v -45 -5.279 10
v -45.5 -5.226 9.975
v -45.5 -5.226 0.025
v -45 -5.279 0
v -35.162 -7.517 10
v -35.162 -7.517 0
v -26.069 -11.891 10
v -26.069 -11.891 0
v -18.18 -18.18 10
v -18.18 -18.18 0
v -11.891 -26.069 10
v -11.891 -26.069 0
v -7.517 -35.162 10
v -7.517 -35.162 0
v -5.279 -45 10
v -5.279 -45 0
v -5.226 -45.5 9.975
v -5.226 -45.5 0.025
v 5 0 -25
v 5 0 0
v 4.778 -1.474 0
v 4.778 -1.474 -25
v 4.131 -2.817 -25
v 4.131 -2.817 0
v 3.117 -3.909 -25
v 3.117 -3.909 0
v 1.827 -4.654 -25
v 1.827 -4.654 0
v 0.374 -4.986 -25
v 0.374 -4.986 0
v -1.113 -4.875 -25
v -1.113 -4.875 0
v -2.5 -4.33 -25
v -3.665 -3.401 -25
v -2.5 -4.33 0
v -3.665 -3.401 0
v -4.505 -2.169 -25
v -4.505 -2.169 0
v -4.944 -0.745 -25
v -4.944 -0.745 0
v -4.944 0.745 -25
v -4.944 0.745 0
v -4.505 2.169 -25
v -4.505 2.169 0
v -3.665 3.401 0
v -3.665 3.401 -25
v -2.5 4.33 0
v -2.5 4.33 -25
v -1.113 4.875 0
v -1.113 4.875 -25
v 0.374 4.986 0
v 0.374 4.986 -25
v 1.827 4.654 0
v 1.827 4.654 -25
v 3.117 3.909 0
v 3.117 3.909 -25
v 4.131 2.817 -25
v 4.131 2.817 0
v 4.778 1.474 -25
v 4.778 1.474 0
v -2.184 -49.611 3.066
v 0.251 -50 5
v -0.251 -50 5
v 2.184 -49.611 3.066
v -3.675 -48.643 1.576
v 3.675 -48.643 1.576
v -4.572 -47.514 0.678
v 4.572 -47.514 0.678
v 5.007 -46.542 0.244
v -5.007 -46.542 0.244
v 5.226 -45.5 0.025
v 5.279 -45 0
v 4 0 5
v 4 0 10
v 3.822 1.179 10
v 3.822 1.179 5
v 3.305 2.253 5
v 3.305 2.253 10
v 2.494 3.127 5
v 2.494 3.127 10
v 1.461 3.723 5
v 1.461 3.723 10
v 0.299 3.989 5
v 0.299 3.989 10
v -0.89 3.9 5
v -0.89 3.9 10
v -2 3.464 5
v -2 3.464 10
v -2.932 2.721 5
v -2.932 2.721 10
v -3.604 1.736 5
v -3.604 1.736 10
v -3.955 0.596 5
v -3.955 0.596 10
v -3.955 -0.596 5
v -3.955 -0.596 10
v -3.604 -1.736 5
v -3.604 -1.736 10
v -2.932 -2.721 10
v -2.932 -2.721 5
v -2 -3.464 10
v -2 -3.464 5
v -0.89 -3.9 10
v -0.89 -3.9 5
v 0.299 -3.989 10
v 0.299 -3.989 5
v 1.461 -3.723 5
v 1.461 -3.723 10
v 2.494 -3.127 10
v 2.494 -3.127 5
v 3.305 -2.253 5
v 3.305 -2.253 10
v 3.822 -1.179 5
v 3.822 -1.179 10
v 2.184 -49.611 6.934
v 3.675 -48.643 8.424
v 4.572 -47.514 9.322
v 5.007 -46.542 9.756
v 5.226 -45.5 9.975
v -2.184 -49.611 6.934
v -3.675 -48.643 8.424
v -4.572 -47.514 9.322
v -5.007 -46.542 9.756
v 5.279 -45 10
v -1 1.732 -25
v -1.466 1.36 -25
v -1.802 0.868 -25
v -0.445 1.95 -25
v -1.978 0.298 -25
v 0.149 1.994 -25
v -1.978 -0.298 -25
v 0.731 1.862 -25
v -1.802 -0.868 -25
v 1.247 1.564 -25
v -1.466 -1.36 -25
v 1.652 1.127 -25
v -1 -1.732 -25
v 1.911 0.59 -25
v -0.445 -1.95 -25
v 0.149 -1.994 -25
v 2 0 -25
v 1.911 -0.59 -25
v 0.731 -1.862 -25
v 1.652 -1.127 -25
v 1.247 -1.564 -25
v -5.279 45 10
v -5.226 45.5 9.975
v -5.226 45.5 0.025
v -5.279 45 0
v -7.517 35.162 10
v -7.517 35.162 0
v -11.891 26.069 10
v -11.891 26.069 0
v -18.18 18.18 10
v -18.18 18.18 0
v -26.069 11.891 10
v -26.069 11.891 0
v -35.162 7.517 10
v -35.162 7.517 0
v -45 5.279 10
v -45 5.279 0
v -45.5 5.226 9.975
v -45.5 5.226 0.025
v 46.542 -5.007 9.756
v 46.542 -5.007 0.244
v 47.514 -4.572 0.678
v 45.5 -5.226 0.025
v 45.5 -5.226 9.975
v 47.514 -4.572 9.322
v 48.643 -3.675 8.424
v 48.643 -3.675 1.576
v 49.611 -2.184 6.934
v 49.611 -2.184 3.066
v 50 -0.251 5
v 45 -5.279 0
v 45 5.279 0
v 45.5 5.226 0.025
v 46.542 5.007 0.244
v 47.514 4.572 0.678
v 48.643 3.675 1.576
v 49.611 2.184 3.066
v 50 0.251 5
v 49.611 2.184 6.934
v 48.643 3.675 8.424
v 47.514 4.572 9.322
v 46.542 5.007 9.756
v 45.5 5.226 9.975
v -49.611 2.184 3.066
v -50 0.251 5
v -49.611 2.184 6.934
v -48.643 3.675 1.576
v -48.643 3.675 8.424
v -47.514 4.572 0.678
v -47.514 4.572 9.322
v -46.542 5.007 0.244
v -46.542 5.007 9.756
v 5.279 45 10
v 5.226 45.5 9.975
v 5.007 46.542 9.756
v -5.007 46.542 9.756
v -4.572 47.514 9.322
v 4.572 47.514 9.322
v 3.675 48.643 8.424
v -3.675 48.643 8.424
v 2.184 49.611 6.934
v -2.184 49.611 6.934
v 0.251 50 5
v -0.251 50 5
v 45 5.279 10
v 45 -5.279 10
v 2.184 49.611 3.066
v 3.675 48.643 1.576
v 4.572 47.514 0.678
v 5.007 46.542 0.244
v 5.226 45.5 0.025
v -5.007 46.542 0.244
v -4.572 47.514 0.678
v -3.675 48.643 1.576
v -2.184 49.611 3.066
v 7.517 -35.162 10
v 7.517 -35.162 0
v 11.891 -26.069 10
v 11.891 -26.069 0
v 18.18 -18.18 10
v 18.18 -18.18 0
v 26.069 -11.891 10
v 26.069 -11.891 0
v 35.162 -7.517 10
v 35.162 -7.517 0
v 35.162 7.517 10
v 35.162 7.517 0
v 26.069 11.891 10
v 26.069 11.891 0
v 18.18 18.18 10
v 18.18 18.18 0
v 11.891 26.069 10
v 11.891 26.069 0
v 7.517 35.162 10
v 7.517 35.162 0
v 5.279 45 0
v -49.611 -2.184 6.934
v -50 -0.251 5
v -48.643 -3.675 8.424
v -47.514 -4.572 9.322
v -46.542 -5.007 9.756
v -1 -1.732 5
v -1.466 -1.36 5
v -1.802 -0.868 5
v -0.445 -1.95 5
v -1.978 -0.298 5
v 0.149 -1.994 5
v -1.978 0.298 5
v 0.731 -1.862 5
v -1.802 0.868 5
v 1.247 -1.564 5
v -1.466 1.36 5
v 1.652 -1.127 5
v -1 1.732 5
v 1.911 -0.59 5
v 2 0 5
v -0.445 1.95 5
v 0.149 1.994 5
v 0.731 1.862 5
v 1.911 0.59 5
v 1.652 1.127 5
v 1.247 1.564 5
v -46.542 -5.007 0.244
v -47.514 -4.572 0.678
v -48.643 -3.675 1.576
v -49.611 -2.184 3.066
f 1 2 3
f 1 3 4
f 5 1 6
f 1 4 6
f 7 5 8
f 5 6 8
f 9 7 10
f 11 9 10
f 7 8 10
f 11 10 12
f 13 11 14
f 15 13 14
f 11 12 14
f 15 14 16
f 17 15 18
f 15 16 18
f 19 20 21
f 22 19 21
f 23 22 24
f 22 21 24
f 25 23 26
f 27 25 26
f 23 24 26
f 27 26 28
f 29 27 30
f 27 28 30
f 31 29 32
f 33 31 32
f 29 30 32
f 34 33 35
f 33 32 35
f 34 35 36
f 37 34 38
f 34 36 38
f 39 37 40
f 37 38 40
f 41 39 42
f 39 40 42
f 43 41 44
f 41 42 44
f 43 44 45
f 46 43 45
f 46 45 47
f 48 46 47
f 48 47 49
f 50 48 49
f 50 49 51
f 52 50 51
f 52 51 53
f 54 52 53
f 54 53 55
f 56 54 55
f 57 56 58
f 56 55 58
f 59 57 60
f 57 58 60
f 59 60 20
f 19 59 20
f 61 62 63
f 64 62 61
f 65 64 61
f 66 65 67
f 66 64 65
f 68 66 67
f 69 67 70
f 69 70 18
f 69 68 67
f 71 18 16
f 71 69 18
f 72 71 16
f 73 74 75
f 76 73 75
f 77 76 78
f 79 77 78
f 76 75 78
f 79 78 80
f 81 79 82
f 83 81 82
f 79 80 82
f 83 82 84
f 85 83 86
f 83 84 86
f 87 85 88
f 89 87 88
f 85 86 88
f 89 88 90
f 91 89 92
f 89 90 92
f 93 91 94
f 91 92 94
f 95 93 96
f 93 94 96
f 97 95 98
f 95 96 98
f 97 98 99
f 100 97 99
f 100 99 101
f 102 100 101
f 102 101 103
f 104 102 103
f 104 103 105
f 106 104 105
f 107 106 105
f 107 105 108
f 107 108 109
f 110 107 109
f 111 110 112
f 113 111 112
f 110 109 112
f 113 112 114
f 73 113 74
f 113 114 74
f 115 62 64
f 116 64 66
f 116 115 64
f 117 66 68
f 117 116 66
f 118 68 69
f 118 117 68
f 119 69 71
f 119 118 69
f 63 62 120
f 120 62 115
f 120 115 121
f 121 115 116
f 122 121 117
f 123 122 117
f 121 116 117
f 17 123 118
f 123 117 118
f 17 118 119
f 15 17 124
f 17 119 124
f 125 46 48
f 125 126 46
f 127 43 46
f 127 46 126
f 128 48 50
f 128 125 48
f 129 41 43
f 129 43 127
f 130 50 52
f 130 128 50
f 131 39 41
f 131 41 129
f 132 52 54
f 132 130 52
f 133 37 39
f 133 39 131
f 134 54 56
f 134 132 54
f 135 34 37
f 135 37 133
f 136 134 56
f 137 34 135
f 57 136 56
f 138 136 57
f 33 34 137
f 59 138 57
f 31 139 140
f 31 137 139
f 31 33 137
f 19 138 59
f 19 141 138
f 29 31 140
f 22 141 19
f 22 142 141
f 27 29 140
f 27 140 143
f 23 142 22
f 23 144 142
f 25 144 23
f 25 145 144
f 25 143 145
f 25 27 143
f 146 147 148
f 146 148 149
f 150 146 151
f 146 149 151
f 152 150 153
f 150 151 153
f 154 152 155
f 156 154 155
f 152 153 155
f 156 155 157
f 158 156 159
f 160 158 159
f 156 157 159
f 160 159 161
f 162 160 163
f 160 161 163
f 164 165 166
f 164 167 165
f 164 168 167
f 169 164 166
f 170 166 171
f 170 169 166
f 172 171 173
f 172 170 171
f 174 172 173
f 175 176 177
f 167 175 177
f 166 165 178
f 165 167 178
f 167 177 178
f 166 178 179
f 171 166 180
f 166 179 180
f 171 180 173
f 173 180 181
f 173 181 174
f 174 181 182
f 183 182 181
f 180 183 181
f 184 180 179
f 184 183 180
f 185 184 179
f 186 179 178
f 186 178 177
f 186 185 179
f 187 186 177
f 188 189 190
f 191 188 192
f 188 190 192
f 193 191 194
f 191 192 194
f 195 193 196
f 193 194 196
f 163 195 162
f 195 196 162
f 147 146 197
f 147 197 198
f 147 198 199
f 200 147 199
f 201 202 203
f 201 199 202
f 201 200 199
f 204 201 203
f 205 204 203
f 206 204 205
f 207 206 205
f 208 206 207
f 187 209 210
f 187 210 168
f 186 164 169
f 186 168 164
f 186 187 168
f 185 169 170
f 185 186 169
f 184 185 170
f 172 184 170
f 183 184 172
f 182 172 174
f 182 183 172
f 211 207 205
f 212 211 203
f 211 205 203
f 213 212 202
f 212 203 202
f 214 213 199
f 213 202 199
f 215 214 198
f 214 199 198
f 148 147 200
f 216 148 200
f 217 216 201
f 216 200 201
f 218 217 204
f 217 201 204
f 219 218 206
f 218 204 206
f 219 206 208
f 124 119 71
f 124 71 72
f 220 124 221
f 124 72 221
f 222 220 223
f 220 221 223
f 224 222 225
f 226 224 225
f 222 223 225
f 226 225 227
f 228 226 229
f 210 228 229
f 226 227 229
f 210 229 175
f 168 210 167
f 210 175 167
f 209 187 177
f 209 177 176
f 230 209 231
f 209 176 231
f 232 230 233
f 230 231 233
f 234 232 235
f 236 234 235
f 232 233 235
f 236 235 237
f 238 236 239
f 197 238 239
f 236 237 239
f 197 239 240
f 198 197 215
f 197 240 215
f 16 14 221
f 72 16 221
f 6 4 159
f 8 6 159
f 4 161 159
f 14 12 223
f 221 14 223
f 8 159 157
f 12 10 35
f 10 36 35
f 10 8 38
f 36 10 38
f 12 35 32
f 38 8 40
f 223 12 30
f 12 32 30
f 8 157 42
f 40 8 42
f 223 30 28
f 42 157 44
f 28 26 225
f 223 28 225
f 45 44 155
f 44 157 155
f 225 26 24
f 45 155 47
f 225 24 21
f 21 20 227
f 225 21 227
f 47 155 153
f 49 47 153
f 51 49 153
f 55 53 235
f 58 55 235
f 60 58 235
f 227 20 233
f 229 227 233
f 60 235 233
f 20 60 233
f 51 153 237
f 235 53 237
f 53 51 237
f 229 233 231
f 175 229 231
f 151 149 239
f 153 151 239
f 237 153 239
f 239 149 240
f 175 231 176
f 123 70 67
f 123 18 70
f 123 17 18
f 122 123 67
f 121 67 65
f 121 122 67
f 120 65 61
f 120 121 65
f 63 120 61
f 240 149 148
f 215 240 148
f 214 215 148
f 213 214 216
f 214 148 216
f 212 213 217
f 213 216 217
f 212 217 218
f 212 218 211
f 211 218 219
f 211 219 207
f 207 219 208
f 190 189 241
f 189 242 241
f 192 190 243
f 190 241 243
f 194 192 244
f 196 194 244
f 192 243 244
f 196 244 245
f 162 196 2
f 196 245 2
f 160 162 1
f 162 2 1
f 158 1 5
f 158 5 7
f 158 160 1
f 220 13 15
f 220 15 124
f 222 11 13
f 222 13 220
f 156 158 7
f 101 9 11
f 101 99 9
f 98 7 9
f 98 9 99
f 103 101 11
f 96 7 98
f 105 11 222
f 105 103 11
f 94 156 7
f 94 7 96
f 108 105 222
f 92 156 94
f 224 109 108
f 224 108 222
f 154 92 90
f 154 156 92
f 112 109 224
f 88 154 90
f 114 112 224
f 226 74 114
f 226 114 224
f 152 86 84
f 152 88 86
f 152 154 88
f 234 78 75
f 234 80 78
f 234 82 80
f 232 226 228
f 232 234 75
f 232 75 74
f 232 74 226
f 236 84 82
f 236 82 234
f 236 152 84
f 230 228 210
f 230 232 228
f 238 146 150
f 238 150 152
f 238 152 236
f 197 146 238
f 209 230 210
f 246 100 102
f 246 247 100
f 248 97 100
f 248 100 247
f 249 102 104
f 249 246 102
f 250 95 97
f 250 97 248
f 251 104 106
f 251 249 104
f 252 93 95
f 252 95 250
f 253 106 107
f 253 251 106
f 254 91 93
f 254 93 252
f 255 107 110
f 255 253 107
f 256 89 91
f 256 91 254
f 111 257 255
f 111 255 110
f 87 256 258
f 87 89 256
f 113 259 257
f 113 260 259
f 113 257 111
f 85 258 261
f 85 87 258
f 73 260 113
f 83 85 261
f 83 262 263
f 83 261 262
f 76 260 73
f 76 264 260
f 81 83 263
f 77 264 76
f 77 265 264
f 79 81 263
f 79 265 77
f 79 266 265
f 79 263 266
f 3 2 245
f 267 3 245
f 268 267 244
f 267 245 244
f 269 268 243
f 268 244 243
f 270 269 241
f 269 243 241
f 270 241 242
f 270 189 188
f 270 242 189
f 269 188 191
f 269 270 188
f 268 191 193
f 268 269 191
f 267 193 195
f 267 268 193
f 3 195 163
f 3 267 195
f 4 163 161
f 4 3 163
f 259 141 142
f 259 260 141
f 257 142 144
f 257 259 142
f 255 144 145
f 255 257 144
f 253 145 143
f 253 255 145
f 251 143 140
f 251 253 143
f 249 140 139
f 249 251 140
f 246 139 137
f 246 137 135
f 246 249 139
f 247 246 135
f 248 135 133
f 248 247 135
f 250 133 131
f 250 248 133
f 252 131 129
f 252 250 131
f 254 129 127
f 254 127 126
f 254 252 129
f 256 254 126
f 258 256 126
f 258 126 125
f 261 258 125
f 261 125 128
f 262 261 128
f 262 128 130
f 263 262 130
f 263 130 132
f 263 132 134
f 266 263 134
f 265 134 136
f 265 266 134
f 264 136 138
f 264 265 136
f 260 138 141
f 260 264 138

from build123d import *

# Parameters (mm, degrees)
F1_DEPTH = 10
F2_R     = 2
F3_DEPTH = 10
F2_R_2   = 4
F4_DEPTH = 5
F5_R     = 4.99999
F6_R     = 5
F6_R_2   = 2
F7_DEPTH = 25


# Not quite as in the source:
# - a fillet or chamfer is up to 0.001 mm smaller than in the source, because OpenCascade refuses the exact size


with BuildPart() as f1:
    # F0 (on Top) → F1 (new body)
    with BuildSketch(Plane.XY):
        with BuildLine():
            ThreePointArc((-50, -5), (-18.1801948466, -18.1801948466), (-5, -50))
            Line((-5, -50), (5, -50))
            ThreePointArc((5, -50), (18.1801948466, -18.1801948466), (50, -5))
            Line((50, -5), (50, 5))
            ThreePointArc((50, 5), (18.1801948466, 18.1801948466), (5, 50))
            Line((5, 50), (-5, 50))
            ThreePointArc((-5, 50), (-18.1801948466, 18.1801948466), (-50, 5))
            Line((-50, 5), (-50, -5))
        make_face()
    extrude(amount=F1_DEPTH)

    # F2 (on face) → F3 (cut, through all)
    with BuildSketch(Plane.XY.offset(10)):
        Circle(F2_R)
    extrude(amount=-F3_DEPTH, mode=Mode.SUBTRACT)

    # F2 (on face) → F4 (cut)
    with BuildSketch(Plane.XY.offset(10)):
        Circle(F2_R_2)
        Circle(F2_R, mode=Mode.SUBTRACT)
    extrude(amount=-F4_DEPTH, mode=Mode.SUBTRACT)

    # F5 (radius 5 in the source; OpenCascade refuses exactly that, so slightly less here)
    f5_edges = [f1.edges().sort_by_distance(p)[0] for p in [
        (5, 50, 5),
        (-5, 50, 5),
        (0, 50, 0),
        (0, 50, 10),
        (-50, 5, 5),
        (-50, -5, 5),
        (-50, 0, 0),
        (-50, 0, 10),
        (-5, -50, 5),
        (5, -50, 5),
        (0, -50, 0),
        (0, -50, 10),
        (50, -5, 5),
        (50, 5, 5),
        (50, 0, 0),
        (50, 0, 10),
    ]]
    fillet(f5_edges, radius=F5_R)

    # F6 (on face) → F7 (join)
    with BuildSketch(Plane(origin=(0, 0, 0), x_dir=(1, 0, 0), z_dir=(0, 0, -1))):
        Circle(F6_R)
        Circle(F6_R_2, mode=Mode.SUBTRACT)
    extrude(amount=F7_DEPTH)


solid = f1.part
